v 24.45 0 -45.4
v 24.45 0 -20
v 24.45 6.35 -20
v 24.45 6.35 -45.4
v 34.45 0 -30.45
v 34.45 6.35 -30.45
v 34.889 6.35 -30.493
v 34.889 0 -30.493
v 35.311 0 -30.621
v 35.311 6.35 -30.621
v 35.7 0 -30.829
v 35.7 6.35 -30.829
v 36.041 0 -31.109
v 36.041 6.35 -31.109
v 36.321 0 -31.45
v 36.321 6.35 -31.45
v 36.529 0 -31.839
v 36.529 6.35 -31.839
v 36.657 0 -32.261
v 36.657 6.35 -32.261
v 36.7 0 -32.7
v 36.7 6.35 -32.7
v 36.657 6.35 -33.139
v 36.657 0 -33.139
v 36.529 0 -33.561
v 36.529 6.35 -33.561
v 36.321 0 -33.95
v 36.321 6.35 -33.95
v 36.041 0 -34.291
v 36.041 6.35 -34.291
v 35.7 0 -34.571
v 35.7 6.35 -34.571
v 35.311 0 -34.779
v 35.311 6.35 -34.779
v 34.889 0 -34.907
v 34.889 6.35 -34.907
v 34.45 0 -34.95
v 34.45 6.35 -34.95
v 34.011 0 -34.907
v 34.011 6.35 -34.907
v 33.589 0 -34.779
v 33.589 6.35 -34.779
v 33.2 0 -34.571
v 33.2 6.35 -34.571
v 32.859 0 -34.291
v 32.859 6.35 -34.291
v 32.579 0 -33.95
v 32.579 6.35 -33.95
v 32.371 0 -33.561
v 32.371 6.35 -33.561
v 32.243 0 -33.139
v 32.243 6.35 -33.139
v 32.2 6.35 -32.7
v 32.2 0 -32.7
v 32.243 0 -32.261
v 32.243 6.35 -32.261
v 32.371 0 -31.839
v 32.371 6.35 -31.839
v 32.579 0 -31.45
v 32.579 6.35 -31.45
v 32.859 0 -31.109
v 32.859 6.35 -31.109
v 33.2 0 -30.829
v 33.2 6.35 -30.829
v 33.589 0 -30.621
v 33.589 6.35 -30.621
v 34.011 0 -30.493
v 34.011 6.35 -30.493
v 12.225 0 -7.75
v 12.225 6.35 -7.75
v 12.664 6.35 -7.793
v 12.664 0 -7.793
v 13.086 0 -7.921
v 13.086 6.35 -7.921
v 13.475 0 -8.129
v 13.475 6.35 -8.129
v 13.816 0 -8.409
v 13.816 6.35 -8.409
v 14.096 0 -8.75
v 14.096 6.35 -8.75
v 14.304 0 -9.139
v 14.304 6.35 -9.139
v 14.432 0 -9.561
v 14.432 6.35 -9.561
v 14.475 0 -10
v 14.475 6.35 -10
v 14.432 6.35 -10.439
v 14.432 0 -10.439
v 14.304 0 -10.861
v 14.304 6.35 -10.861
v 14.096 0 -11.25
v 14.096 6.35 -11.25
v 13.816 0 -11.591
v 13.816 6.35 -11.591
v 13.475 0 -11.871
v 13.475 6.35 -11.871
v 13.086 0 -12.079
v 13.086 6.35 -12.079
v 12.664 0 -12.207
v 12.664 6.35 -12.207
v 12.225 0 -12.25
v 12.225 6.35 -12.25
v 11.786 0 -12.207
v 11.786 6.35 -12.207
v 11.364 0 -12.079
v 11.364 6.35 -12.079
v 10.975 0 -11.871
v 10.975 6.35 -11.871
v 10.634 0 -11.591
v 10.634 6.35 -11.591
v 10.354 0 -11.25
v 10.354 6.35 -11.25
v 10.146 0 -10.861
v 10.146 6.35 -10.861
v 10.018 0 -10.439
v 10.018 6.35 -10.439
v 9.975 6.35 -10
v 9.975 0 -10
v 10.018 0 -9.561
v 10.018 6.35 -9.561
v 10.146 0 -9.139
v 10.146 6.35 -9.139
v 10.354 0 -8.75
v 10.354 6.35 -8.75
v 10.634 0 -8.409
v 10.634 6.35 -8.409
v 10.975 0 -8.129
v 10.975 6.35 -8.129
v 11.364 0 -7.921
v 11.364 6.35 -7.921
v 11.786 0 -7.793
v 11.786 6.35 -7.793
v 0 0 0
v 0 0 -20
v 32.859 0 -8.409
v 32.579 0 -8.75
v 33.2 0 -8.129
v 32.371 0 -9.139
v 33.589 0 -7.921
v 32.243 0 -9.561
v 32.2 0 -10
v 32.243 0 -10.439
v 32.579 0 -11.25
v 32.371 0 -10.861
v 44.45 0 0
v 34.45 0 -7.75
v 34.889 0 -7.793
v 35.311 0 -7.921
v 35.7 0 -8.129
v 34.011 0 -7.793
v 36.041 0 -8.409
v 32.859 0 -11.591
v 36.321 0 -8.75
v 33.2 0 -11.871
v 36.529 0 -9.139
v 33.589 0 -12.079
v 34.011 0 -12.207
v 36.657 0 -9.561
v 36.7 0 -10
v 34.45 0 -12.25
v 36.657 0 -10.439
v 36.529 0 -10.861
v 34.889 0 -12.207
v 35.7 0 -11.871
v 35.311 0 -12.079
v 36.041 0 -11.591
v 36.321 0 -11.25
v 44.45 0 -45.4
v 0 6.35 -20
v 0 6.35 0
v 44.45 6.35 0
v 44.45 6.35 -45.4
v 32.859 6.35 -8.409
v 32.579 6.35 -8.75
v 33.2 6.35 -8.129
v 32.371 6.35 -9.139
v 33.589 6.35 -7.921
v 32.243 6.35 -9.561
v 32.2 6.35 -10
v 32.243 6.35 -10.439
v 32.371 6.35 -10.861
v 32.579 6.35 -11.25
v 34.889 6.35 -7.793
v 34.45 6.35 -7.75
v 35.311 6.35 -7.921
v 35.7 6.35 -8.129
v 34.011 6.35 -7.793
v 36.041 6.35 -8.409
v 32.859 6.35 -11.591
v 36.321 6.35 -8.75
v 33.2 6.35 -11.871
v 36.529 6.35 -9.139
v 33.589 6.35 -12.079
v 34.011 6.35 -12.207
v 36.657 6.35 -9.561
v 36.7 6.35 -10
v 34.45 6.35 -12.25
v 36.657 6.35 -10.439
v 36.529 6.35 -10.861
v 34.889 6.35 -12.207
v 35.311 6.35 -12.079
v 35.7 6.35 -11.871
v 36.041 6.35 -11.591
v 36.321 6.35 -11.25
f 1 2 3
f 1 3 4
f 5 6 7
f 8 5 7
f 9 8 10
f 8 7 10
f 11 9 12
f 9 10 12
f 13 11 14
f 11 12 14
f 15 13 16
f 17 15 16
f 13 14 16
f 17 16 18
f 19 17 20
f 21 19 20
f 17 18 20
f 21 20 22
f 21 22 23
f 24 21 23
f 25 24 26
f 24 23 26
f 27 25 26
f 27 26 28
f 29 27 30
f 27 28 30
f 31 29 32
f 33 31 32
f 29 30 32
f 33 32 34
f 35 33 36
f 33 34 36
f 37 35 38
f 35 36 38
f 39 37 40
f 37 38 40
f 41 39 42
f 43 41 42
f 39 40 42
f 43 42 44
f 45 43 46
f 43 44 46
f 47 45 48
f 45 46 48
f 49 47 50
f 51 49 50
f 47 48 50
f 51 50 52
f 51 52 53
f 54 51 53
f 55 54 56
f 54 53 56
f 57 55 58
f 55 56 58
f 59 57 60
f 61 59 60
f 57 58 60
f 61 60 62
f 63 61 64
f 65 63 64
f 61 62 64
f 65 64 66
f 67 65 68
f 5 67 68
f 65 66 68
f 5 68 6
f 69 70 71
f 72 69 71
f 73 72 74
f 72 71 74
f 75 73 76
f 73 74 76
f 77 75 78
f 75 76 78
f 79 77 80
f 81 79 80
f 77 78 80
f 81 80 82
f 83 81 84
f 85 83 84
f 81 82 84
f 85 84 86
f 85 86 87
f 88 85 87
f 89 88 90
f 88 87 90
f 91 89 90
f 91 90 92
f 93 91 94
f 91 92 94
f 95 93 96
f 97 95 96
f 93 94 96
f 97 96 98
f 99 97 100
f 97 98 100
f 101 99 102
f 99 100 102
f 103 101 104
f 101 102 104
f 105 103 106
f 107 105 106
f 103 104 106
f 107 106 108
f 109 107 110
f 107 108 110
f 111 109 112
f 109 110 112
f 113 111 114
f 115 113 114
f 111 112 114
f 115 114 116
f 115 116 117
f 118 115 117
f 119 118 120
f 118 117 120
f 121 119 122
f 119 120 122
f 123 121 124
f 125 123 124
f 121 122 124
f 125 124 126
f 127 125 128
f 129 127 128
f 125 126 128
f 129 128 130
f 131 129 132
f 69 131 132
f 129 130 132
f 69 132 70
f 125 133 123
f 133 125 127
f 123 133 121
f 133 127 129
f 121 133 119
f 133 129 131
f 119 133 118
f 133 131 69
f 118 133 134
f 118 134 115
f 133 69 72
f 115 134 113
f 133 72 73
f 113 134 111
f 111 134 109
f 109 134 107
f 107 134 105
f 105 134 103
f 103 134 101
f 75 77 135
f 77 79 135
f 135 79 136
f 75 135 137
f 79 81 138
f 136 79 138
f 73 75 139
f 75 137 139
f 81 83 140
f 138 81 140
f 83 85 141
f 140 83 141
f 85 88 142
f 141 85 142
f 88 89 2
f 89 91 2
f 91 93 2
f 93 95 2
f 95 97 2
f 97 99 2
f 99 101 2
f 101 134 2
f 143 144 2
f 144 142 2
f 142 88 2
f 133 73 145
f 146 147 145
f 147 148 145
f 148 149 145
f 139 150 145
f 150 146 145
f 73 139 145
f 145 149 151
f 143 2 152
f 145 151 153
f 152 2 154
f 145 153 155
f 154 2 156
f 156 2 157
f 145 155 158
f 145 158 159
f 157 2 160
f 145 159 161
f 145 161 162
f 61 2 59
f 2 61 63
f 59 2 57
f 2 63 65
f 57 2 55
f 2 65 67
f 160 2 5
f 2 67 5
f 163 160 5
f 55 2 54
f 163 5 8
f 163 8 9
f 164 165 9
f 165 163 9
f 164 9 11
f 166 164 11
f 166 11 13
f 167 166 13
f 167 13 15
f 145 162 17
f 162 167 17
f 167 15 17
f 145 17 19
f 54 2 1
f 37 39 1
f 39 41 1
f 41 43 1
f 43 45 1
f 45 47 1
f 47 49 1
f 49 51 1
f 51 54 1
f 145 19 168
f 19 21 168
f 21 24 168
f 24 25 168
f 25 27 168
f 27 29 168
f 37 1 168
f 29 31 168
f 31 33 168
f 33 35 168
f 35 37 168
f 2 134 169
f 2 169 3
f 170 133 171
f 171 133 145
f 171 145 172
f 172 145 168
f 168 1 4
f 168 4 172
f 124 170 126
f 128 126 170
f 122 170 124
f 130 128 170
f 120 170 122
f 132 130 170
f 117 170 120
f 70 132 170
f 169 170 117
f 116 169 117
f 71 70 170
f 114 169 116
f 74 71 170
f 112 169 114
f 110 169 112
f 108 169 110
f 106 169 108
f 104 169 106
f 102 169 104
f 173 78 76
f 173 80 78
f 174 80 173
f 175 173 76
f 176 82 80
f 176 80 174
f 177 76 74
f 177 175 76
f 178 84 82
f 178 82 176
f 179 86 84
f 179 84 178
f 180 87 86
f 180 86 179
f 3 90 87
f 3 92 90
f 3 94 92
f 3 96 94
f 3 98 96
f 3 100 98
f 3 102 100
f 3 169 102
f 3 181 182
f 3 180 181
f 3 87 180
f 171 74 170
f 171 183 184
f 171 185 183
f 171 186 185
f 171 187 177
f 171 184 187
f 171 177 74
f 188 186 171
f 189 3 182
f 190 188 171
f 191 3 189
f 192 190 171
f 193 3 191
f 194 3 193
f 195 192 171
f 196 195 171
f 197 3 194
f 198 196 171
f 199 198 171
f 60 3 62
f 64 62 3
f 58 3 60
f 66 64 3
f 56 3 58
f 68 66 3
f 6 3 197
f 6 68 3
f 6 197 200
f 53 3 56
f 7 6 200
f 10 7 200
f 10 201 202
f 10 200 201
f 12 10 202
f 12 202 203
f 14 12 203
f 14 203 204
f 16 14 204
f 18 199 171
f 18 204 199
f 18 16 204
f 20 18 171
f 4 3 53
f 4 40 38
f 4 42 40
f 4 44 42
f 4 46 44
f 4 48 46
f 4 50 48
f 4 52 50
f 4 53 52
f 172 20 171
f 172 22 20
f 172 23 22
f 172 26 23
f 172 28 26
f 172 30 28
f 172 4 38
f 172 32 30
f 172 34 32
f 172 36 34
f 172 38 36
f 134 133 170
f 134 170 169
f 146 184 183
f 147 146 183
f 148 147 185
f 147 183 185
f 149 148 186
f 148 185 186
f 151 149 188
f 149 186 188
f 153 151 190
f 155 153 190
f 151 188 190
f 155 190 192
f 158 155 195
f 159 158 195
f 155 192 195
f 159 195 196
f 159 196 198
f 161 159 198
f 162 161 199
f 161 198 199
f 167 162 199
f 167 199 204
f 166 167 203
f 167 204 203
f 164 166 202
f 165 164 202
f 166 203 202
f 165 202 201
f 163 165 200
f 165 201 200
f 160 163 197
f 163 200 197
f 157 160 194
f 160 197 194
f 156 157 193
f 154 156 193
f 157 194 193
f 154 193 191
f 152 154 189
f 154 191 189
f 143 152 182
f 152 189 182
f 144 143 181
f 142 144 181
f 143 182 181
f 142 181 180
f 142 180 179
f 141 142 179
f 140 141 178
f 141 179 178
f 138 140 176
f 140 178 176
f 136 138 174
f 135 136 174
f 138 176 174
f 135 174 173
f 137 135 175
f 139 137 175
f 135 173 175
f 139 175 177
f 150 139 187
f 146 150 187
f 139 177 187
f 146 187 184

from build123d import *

# Parameters (mm, degrees)
SKETCH1_W           = 20
SKETCH1_H           = 25.4
SKETCH1_W_2         = 44.45
SKETCH1_H_2         = 20
BOSS_EXTRUDE1_DEPTH = 6.35
SKETCH2_R           = 2.25
CUT_EXTRUDE1_DEPTH  = 6.35


with BuildPart() as part:
    # Sketch1 → Boss-Extrude1 (new body)
    with BuildSketch(Plane(origin=(0, 0, 0), x_dir=(1, 0, 0), z_dir=(0, 1, 0))):
        with Locations((34.45, 32.7)):
            Rectangle(SKETCH1_W, SKETCH1_H)
        with Locations((22.225, 10)):
            Rectangle(SKETCH1_W_2, SKETCH1_H_2)
    extrude(amount=BOSS_EXTRUDE1_DEPTH)

    # Sketch2 → Cut-Extrude1 (cut)
    with BuildSketch(Plane(origin=(0, 6.35, 0), x_dir=(1, 0, 0), z_dir=(0, 1, 0))):
        with Locations(Location((12.225, 10, 0), (0, 0, 270))):
            Circle(SKETCH2_R)
        with Locations(Location((34.45, 10, 0), (0, 0, 270))):
            Circle(SKETCH2_R)
        with Locations(Location((34.45, 32.7, 0), (0, 0, 270))):
            Circle(SKETCH2_R)
    extrude(amount=-CUT_EXTRUDE1_DEPTH, mode=Mode.SUBTRACT)


solid = part.part
